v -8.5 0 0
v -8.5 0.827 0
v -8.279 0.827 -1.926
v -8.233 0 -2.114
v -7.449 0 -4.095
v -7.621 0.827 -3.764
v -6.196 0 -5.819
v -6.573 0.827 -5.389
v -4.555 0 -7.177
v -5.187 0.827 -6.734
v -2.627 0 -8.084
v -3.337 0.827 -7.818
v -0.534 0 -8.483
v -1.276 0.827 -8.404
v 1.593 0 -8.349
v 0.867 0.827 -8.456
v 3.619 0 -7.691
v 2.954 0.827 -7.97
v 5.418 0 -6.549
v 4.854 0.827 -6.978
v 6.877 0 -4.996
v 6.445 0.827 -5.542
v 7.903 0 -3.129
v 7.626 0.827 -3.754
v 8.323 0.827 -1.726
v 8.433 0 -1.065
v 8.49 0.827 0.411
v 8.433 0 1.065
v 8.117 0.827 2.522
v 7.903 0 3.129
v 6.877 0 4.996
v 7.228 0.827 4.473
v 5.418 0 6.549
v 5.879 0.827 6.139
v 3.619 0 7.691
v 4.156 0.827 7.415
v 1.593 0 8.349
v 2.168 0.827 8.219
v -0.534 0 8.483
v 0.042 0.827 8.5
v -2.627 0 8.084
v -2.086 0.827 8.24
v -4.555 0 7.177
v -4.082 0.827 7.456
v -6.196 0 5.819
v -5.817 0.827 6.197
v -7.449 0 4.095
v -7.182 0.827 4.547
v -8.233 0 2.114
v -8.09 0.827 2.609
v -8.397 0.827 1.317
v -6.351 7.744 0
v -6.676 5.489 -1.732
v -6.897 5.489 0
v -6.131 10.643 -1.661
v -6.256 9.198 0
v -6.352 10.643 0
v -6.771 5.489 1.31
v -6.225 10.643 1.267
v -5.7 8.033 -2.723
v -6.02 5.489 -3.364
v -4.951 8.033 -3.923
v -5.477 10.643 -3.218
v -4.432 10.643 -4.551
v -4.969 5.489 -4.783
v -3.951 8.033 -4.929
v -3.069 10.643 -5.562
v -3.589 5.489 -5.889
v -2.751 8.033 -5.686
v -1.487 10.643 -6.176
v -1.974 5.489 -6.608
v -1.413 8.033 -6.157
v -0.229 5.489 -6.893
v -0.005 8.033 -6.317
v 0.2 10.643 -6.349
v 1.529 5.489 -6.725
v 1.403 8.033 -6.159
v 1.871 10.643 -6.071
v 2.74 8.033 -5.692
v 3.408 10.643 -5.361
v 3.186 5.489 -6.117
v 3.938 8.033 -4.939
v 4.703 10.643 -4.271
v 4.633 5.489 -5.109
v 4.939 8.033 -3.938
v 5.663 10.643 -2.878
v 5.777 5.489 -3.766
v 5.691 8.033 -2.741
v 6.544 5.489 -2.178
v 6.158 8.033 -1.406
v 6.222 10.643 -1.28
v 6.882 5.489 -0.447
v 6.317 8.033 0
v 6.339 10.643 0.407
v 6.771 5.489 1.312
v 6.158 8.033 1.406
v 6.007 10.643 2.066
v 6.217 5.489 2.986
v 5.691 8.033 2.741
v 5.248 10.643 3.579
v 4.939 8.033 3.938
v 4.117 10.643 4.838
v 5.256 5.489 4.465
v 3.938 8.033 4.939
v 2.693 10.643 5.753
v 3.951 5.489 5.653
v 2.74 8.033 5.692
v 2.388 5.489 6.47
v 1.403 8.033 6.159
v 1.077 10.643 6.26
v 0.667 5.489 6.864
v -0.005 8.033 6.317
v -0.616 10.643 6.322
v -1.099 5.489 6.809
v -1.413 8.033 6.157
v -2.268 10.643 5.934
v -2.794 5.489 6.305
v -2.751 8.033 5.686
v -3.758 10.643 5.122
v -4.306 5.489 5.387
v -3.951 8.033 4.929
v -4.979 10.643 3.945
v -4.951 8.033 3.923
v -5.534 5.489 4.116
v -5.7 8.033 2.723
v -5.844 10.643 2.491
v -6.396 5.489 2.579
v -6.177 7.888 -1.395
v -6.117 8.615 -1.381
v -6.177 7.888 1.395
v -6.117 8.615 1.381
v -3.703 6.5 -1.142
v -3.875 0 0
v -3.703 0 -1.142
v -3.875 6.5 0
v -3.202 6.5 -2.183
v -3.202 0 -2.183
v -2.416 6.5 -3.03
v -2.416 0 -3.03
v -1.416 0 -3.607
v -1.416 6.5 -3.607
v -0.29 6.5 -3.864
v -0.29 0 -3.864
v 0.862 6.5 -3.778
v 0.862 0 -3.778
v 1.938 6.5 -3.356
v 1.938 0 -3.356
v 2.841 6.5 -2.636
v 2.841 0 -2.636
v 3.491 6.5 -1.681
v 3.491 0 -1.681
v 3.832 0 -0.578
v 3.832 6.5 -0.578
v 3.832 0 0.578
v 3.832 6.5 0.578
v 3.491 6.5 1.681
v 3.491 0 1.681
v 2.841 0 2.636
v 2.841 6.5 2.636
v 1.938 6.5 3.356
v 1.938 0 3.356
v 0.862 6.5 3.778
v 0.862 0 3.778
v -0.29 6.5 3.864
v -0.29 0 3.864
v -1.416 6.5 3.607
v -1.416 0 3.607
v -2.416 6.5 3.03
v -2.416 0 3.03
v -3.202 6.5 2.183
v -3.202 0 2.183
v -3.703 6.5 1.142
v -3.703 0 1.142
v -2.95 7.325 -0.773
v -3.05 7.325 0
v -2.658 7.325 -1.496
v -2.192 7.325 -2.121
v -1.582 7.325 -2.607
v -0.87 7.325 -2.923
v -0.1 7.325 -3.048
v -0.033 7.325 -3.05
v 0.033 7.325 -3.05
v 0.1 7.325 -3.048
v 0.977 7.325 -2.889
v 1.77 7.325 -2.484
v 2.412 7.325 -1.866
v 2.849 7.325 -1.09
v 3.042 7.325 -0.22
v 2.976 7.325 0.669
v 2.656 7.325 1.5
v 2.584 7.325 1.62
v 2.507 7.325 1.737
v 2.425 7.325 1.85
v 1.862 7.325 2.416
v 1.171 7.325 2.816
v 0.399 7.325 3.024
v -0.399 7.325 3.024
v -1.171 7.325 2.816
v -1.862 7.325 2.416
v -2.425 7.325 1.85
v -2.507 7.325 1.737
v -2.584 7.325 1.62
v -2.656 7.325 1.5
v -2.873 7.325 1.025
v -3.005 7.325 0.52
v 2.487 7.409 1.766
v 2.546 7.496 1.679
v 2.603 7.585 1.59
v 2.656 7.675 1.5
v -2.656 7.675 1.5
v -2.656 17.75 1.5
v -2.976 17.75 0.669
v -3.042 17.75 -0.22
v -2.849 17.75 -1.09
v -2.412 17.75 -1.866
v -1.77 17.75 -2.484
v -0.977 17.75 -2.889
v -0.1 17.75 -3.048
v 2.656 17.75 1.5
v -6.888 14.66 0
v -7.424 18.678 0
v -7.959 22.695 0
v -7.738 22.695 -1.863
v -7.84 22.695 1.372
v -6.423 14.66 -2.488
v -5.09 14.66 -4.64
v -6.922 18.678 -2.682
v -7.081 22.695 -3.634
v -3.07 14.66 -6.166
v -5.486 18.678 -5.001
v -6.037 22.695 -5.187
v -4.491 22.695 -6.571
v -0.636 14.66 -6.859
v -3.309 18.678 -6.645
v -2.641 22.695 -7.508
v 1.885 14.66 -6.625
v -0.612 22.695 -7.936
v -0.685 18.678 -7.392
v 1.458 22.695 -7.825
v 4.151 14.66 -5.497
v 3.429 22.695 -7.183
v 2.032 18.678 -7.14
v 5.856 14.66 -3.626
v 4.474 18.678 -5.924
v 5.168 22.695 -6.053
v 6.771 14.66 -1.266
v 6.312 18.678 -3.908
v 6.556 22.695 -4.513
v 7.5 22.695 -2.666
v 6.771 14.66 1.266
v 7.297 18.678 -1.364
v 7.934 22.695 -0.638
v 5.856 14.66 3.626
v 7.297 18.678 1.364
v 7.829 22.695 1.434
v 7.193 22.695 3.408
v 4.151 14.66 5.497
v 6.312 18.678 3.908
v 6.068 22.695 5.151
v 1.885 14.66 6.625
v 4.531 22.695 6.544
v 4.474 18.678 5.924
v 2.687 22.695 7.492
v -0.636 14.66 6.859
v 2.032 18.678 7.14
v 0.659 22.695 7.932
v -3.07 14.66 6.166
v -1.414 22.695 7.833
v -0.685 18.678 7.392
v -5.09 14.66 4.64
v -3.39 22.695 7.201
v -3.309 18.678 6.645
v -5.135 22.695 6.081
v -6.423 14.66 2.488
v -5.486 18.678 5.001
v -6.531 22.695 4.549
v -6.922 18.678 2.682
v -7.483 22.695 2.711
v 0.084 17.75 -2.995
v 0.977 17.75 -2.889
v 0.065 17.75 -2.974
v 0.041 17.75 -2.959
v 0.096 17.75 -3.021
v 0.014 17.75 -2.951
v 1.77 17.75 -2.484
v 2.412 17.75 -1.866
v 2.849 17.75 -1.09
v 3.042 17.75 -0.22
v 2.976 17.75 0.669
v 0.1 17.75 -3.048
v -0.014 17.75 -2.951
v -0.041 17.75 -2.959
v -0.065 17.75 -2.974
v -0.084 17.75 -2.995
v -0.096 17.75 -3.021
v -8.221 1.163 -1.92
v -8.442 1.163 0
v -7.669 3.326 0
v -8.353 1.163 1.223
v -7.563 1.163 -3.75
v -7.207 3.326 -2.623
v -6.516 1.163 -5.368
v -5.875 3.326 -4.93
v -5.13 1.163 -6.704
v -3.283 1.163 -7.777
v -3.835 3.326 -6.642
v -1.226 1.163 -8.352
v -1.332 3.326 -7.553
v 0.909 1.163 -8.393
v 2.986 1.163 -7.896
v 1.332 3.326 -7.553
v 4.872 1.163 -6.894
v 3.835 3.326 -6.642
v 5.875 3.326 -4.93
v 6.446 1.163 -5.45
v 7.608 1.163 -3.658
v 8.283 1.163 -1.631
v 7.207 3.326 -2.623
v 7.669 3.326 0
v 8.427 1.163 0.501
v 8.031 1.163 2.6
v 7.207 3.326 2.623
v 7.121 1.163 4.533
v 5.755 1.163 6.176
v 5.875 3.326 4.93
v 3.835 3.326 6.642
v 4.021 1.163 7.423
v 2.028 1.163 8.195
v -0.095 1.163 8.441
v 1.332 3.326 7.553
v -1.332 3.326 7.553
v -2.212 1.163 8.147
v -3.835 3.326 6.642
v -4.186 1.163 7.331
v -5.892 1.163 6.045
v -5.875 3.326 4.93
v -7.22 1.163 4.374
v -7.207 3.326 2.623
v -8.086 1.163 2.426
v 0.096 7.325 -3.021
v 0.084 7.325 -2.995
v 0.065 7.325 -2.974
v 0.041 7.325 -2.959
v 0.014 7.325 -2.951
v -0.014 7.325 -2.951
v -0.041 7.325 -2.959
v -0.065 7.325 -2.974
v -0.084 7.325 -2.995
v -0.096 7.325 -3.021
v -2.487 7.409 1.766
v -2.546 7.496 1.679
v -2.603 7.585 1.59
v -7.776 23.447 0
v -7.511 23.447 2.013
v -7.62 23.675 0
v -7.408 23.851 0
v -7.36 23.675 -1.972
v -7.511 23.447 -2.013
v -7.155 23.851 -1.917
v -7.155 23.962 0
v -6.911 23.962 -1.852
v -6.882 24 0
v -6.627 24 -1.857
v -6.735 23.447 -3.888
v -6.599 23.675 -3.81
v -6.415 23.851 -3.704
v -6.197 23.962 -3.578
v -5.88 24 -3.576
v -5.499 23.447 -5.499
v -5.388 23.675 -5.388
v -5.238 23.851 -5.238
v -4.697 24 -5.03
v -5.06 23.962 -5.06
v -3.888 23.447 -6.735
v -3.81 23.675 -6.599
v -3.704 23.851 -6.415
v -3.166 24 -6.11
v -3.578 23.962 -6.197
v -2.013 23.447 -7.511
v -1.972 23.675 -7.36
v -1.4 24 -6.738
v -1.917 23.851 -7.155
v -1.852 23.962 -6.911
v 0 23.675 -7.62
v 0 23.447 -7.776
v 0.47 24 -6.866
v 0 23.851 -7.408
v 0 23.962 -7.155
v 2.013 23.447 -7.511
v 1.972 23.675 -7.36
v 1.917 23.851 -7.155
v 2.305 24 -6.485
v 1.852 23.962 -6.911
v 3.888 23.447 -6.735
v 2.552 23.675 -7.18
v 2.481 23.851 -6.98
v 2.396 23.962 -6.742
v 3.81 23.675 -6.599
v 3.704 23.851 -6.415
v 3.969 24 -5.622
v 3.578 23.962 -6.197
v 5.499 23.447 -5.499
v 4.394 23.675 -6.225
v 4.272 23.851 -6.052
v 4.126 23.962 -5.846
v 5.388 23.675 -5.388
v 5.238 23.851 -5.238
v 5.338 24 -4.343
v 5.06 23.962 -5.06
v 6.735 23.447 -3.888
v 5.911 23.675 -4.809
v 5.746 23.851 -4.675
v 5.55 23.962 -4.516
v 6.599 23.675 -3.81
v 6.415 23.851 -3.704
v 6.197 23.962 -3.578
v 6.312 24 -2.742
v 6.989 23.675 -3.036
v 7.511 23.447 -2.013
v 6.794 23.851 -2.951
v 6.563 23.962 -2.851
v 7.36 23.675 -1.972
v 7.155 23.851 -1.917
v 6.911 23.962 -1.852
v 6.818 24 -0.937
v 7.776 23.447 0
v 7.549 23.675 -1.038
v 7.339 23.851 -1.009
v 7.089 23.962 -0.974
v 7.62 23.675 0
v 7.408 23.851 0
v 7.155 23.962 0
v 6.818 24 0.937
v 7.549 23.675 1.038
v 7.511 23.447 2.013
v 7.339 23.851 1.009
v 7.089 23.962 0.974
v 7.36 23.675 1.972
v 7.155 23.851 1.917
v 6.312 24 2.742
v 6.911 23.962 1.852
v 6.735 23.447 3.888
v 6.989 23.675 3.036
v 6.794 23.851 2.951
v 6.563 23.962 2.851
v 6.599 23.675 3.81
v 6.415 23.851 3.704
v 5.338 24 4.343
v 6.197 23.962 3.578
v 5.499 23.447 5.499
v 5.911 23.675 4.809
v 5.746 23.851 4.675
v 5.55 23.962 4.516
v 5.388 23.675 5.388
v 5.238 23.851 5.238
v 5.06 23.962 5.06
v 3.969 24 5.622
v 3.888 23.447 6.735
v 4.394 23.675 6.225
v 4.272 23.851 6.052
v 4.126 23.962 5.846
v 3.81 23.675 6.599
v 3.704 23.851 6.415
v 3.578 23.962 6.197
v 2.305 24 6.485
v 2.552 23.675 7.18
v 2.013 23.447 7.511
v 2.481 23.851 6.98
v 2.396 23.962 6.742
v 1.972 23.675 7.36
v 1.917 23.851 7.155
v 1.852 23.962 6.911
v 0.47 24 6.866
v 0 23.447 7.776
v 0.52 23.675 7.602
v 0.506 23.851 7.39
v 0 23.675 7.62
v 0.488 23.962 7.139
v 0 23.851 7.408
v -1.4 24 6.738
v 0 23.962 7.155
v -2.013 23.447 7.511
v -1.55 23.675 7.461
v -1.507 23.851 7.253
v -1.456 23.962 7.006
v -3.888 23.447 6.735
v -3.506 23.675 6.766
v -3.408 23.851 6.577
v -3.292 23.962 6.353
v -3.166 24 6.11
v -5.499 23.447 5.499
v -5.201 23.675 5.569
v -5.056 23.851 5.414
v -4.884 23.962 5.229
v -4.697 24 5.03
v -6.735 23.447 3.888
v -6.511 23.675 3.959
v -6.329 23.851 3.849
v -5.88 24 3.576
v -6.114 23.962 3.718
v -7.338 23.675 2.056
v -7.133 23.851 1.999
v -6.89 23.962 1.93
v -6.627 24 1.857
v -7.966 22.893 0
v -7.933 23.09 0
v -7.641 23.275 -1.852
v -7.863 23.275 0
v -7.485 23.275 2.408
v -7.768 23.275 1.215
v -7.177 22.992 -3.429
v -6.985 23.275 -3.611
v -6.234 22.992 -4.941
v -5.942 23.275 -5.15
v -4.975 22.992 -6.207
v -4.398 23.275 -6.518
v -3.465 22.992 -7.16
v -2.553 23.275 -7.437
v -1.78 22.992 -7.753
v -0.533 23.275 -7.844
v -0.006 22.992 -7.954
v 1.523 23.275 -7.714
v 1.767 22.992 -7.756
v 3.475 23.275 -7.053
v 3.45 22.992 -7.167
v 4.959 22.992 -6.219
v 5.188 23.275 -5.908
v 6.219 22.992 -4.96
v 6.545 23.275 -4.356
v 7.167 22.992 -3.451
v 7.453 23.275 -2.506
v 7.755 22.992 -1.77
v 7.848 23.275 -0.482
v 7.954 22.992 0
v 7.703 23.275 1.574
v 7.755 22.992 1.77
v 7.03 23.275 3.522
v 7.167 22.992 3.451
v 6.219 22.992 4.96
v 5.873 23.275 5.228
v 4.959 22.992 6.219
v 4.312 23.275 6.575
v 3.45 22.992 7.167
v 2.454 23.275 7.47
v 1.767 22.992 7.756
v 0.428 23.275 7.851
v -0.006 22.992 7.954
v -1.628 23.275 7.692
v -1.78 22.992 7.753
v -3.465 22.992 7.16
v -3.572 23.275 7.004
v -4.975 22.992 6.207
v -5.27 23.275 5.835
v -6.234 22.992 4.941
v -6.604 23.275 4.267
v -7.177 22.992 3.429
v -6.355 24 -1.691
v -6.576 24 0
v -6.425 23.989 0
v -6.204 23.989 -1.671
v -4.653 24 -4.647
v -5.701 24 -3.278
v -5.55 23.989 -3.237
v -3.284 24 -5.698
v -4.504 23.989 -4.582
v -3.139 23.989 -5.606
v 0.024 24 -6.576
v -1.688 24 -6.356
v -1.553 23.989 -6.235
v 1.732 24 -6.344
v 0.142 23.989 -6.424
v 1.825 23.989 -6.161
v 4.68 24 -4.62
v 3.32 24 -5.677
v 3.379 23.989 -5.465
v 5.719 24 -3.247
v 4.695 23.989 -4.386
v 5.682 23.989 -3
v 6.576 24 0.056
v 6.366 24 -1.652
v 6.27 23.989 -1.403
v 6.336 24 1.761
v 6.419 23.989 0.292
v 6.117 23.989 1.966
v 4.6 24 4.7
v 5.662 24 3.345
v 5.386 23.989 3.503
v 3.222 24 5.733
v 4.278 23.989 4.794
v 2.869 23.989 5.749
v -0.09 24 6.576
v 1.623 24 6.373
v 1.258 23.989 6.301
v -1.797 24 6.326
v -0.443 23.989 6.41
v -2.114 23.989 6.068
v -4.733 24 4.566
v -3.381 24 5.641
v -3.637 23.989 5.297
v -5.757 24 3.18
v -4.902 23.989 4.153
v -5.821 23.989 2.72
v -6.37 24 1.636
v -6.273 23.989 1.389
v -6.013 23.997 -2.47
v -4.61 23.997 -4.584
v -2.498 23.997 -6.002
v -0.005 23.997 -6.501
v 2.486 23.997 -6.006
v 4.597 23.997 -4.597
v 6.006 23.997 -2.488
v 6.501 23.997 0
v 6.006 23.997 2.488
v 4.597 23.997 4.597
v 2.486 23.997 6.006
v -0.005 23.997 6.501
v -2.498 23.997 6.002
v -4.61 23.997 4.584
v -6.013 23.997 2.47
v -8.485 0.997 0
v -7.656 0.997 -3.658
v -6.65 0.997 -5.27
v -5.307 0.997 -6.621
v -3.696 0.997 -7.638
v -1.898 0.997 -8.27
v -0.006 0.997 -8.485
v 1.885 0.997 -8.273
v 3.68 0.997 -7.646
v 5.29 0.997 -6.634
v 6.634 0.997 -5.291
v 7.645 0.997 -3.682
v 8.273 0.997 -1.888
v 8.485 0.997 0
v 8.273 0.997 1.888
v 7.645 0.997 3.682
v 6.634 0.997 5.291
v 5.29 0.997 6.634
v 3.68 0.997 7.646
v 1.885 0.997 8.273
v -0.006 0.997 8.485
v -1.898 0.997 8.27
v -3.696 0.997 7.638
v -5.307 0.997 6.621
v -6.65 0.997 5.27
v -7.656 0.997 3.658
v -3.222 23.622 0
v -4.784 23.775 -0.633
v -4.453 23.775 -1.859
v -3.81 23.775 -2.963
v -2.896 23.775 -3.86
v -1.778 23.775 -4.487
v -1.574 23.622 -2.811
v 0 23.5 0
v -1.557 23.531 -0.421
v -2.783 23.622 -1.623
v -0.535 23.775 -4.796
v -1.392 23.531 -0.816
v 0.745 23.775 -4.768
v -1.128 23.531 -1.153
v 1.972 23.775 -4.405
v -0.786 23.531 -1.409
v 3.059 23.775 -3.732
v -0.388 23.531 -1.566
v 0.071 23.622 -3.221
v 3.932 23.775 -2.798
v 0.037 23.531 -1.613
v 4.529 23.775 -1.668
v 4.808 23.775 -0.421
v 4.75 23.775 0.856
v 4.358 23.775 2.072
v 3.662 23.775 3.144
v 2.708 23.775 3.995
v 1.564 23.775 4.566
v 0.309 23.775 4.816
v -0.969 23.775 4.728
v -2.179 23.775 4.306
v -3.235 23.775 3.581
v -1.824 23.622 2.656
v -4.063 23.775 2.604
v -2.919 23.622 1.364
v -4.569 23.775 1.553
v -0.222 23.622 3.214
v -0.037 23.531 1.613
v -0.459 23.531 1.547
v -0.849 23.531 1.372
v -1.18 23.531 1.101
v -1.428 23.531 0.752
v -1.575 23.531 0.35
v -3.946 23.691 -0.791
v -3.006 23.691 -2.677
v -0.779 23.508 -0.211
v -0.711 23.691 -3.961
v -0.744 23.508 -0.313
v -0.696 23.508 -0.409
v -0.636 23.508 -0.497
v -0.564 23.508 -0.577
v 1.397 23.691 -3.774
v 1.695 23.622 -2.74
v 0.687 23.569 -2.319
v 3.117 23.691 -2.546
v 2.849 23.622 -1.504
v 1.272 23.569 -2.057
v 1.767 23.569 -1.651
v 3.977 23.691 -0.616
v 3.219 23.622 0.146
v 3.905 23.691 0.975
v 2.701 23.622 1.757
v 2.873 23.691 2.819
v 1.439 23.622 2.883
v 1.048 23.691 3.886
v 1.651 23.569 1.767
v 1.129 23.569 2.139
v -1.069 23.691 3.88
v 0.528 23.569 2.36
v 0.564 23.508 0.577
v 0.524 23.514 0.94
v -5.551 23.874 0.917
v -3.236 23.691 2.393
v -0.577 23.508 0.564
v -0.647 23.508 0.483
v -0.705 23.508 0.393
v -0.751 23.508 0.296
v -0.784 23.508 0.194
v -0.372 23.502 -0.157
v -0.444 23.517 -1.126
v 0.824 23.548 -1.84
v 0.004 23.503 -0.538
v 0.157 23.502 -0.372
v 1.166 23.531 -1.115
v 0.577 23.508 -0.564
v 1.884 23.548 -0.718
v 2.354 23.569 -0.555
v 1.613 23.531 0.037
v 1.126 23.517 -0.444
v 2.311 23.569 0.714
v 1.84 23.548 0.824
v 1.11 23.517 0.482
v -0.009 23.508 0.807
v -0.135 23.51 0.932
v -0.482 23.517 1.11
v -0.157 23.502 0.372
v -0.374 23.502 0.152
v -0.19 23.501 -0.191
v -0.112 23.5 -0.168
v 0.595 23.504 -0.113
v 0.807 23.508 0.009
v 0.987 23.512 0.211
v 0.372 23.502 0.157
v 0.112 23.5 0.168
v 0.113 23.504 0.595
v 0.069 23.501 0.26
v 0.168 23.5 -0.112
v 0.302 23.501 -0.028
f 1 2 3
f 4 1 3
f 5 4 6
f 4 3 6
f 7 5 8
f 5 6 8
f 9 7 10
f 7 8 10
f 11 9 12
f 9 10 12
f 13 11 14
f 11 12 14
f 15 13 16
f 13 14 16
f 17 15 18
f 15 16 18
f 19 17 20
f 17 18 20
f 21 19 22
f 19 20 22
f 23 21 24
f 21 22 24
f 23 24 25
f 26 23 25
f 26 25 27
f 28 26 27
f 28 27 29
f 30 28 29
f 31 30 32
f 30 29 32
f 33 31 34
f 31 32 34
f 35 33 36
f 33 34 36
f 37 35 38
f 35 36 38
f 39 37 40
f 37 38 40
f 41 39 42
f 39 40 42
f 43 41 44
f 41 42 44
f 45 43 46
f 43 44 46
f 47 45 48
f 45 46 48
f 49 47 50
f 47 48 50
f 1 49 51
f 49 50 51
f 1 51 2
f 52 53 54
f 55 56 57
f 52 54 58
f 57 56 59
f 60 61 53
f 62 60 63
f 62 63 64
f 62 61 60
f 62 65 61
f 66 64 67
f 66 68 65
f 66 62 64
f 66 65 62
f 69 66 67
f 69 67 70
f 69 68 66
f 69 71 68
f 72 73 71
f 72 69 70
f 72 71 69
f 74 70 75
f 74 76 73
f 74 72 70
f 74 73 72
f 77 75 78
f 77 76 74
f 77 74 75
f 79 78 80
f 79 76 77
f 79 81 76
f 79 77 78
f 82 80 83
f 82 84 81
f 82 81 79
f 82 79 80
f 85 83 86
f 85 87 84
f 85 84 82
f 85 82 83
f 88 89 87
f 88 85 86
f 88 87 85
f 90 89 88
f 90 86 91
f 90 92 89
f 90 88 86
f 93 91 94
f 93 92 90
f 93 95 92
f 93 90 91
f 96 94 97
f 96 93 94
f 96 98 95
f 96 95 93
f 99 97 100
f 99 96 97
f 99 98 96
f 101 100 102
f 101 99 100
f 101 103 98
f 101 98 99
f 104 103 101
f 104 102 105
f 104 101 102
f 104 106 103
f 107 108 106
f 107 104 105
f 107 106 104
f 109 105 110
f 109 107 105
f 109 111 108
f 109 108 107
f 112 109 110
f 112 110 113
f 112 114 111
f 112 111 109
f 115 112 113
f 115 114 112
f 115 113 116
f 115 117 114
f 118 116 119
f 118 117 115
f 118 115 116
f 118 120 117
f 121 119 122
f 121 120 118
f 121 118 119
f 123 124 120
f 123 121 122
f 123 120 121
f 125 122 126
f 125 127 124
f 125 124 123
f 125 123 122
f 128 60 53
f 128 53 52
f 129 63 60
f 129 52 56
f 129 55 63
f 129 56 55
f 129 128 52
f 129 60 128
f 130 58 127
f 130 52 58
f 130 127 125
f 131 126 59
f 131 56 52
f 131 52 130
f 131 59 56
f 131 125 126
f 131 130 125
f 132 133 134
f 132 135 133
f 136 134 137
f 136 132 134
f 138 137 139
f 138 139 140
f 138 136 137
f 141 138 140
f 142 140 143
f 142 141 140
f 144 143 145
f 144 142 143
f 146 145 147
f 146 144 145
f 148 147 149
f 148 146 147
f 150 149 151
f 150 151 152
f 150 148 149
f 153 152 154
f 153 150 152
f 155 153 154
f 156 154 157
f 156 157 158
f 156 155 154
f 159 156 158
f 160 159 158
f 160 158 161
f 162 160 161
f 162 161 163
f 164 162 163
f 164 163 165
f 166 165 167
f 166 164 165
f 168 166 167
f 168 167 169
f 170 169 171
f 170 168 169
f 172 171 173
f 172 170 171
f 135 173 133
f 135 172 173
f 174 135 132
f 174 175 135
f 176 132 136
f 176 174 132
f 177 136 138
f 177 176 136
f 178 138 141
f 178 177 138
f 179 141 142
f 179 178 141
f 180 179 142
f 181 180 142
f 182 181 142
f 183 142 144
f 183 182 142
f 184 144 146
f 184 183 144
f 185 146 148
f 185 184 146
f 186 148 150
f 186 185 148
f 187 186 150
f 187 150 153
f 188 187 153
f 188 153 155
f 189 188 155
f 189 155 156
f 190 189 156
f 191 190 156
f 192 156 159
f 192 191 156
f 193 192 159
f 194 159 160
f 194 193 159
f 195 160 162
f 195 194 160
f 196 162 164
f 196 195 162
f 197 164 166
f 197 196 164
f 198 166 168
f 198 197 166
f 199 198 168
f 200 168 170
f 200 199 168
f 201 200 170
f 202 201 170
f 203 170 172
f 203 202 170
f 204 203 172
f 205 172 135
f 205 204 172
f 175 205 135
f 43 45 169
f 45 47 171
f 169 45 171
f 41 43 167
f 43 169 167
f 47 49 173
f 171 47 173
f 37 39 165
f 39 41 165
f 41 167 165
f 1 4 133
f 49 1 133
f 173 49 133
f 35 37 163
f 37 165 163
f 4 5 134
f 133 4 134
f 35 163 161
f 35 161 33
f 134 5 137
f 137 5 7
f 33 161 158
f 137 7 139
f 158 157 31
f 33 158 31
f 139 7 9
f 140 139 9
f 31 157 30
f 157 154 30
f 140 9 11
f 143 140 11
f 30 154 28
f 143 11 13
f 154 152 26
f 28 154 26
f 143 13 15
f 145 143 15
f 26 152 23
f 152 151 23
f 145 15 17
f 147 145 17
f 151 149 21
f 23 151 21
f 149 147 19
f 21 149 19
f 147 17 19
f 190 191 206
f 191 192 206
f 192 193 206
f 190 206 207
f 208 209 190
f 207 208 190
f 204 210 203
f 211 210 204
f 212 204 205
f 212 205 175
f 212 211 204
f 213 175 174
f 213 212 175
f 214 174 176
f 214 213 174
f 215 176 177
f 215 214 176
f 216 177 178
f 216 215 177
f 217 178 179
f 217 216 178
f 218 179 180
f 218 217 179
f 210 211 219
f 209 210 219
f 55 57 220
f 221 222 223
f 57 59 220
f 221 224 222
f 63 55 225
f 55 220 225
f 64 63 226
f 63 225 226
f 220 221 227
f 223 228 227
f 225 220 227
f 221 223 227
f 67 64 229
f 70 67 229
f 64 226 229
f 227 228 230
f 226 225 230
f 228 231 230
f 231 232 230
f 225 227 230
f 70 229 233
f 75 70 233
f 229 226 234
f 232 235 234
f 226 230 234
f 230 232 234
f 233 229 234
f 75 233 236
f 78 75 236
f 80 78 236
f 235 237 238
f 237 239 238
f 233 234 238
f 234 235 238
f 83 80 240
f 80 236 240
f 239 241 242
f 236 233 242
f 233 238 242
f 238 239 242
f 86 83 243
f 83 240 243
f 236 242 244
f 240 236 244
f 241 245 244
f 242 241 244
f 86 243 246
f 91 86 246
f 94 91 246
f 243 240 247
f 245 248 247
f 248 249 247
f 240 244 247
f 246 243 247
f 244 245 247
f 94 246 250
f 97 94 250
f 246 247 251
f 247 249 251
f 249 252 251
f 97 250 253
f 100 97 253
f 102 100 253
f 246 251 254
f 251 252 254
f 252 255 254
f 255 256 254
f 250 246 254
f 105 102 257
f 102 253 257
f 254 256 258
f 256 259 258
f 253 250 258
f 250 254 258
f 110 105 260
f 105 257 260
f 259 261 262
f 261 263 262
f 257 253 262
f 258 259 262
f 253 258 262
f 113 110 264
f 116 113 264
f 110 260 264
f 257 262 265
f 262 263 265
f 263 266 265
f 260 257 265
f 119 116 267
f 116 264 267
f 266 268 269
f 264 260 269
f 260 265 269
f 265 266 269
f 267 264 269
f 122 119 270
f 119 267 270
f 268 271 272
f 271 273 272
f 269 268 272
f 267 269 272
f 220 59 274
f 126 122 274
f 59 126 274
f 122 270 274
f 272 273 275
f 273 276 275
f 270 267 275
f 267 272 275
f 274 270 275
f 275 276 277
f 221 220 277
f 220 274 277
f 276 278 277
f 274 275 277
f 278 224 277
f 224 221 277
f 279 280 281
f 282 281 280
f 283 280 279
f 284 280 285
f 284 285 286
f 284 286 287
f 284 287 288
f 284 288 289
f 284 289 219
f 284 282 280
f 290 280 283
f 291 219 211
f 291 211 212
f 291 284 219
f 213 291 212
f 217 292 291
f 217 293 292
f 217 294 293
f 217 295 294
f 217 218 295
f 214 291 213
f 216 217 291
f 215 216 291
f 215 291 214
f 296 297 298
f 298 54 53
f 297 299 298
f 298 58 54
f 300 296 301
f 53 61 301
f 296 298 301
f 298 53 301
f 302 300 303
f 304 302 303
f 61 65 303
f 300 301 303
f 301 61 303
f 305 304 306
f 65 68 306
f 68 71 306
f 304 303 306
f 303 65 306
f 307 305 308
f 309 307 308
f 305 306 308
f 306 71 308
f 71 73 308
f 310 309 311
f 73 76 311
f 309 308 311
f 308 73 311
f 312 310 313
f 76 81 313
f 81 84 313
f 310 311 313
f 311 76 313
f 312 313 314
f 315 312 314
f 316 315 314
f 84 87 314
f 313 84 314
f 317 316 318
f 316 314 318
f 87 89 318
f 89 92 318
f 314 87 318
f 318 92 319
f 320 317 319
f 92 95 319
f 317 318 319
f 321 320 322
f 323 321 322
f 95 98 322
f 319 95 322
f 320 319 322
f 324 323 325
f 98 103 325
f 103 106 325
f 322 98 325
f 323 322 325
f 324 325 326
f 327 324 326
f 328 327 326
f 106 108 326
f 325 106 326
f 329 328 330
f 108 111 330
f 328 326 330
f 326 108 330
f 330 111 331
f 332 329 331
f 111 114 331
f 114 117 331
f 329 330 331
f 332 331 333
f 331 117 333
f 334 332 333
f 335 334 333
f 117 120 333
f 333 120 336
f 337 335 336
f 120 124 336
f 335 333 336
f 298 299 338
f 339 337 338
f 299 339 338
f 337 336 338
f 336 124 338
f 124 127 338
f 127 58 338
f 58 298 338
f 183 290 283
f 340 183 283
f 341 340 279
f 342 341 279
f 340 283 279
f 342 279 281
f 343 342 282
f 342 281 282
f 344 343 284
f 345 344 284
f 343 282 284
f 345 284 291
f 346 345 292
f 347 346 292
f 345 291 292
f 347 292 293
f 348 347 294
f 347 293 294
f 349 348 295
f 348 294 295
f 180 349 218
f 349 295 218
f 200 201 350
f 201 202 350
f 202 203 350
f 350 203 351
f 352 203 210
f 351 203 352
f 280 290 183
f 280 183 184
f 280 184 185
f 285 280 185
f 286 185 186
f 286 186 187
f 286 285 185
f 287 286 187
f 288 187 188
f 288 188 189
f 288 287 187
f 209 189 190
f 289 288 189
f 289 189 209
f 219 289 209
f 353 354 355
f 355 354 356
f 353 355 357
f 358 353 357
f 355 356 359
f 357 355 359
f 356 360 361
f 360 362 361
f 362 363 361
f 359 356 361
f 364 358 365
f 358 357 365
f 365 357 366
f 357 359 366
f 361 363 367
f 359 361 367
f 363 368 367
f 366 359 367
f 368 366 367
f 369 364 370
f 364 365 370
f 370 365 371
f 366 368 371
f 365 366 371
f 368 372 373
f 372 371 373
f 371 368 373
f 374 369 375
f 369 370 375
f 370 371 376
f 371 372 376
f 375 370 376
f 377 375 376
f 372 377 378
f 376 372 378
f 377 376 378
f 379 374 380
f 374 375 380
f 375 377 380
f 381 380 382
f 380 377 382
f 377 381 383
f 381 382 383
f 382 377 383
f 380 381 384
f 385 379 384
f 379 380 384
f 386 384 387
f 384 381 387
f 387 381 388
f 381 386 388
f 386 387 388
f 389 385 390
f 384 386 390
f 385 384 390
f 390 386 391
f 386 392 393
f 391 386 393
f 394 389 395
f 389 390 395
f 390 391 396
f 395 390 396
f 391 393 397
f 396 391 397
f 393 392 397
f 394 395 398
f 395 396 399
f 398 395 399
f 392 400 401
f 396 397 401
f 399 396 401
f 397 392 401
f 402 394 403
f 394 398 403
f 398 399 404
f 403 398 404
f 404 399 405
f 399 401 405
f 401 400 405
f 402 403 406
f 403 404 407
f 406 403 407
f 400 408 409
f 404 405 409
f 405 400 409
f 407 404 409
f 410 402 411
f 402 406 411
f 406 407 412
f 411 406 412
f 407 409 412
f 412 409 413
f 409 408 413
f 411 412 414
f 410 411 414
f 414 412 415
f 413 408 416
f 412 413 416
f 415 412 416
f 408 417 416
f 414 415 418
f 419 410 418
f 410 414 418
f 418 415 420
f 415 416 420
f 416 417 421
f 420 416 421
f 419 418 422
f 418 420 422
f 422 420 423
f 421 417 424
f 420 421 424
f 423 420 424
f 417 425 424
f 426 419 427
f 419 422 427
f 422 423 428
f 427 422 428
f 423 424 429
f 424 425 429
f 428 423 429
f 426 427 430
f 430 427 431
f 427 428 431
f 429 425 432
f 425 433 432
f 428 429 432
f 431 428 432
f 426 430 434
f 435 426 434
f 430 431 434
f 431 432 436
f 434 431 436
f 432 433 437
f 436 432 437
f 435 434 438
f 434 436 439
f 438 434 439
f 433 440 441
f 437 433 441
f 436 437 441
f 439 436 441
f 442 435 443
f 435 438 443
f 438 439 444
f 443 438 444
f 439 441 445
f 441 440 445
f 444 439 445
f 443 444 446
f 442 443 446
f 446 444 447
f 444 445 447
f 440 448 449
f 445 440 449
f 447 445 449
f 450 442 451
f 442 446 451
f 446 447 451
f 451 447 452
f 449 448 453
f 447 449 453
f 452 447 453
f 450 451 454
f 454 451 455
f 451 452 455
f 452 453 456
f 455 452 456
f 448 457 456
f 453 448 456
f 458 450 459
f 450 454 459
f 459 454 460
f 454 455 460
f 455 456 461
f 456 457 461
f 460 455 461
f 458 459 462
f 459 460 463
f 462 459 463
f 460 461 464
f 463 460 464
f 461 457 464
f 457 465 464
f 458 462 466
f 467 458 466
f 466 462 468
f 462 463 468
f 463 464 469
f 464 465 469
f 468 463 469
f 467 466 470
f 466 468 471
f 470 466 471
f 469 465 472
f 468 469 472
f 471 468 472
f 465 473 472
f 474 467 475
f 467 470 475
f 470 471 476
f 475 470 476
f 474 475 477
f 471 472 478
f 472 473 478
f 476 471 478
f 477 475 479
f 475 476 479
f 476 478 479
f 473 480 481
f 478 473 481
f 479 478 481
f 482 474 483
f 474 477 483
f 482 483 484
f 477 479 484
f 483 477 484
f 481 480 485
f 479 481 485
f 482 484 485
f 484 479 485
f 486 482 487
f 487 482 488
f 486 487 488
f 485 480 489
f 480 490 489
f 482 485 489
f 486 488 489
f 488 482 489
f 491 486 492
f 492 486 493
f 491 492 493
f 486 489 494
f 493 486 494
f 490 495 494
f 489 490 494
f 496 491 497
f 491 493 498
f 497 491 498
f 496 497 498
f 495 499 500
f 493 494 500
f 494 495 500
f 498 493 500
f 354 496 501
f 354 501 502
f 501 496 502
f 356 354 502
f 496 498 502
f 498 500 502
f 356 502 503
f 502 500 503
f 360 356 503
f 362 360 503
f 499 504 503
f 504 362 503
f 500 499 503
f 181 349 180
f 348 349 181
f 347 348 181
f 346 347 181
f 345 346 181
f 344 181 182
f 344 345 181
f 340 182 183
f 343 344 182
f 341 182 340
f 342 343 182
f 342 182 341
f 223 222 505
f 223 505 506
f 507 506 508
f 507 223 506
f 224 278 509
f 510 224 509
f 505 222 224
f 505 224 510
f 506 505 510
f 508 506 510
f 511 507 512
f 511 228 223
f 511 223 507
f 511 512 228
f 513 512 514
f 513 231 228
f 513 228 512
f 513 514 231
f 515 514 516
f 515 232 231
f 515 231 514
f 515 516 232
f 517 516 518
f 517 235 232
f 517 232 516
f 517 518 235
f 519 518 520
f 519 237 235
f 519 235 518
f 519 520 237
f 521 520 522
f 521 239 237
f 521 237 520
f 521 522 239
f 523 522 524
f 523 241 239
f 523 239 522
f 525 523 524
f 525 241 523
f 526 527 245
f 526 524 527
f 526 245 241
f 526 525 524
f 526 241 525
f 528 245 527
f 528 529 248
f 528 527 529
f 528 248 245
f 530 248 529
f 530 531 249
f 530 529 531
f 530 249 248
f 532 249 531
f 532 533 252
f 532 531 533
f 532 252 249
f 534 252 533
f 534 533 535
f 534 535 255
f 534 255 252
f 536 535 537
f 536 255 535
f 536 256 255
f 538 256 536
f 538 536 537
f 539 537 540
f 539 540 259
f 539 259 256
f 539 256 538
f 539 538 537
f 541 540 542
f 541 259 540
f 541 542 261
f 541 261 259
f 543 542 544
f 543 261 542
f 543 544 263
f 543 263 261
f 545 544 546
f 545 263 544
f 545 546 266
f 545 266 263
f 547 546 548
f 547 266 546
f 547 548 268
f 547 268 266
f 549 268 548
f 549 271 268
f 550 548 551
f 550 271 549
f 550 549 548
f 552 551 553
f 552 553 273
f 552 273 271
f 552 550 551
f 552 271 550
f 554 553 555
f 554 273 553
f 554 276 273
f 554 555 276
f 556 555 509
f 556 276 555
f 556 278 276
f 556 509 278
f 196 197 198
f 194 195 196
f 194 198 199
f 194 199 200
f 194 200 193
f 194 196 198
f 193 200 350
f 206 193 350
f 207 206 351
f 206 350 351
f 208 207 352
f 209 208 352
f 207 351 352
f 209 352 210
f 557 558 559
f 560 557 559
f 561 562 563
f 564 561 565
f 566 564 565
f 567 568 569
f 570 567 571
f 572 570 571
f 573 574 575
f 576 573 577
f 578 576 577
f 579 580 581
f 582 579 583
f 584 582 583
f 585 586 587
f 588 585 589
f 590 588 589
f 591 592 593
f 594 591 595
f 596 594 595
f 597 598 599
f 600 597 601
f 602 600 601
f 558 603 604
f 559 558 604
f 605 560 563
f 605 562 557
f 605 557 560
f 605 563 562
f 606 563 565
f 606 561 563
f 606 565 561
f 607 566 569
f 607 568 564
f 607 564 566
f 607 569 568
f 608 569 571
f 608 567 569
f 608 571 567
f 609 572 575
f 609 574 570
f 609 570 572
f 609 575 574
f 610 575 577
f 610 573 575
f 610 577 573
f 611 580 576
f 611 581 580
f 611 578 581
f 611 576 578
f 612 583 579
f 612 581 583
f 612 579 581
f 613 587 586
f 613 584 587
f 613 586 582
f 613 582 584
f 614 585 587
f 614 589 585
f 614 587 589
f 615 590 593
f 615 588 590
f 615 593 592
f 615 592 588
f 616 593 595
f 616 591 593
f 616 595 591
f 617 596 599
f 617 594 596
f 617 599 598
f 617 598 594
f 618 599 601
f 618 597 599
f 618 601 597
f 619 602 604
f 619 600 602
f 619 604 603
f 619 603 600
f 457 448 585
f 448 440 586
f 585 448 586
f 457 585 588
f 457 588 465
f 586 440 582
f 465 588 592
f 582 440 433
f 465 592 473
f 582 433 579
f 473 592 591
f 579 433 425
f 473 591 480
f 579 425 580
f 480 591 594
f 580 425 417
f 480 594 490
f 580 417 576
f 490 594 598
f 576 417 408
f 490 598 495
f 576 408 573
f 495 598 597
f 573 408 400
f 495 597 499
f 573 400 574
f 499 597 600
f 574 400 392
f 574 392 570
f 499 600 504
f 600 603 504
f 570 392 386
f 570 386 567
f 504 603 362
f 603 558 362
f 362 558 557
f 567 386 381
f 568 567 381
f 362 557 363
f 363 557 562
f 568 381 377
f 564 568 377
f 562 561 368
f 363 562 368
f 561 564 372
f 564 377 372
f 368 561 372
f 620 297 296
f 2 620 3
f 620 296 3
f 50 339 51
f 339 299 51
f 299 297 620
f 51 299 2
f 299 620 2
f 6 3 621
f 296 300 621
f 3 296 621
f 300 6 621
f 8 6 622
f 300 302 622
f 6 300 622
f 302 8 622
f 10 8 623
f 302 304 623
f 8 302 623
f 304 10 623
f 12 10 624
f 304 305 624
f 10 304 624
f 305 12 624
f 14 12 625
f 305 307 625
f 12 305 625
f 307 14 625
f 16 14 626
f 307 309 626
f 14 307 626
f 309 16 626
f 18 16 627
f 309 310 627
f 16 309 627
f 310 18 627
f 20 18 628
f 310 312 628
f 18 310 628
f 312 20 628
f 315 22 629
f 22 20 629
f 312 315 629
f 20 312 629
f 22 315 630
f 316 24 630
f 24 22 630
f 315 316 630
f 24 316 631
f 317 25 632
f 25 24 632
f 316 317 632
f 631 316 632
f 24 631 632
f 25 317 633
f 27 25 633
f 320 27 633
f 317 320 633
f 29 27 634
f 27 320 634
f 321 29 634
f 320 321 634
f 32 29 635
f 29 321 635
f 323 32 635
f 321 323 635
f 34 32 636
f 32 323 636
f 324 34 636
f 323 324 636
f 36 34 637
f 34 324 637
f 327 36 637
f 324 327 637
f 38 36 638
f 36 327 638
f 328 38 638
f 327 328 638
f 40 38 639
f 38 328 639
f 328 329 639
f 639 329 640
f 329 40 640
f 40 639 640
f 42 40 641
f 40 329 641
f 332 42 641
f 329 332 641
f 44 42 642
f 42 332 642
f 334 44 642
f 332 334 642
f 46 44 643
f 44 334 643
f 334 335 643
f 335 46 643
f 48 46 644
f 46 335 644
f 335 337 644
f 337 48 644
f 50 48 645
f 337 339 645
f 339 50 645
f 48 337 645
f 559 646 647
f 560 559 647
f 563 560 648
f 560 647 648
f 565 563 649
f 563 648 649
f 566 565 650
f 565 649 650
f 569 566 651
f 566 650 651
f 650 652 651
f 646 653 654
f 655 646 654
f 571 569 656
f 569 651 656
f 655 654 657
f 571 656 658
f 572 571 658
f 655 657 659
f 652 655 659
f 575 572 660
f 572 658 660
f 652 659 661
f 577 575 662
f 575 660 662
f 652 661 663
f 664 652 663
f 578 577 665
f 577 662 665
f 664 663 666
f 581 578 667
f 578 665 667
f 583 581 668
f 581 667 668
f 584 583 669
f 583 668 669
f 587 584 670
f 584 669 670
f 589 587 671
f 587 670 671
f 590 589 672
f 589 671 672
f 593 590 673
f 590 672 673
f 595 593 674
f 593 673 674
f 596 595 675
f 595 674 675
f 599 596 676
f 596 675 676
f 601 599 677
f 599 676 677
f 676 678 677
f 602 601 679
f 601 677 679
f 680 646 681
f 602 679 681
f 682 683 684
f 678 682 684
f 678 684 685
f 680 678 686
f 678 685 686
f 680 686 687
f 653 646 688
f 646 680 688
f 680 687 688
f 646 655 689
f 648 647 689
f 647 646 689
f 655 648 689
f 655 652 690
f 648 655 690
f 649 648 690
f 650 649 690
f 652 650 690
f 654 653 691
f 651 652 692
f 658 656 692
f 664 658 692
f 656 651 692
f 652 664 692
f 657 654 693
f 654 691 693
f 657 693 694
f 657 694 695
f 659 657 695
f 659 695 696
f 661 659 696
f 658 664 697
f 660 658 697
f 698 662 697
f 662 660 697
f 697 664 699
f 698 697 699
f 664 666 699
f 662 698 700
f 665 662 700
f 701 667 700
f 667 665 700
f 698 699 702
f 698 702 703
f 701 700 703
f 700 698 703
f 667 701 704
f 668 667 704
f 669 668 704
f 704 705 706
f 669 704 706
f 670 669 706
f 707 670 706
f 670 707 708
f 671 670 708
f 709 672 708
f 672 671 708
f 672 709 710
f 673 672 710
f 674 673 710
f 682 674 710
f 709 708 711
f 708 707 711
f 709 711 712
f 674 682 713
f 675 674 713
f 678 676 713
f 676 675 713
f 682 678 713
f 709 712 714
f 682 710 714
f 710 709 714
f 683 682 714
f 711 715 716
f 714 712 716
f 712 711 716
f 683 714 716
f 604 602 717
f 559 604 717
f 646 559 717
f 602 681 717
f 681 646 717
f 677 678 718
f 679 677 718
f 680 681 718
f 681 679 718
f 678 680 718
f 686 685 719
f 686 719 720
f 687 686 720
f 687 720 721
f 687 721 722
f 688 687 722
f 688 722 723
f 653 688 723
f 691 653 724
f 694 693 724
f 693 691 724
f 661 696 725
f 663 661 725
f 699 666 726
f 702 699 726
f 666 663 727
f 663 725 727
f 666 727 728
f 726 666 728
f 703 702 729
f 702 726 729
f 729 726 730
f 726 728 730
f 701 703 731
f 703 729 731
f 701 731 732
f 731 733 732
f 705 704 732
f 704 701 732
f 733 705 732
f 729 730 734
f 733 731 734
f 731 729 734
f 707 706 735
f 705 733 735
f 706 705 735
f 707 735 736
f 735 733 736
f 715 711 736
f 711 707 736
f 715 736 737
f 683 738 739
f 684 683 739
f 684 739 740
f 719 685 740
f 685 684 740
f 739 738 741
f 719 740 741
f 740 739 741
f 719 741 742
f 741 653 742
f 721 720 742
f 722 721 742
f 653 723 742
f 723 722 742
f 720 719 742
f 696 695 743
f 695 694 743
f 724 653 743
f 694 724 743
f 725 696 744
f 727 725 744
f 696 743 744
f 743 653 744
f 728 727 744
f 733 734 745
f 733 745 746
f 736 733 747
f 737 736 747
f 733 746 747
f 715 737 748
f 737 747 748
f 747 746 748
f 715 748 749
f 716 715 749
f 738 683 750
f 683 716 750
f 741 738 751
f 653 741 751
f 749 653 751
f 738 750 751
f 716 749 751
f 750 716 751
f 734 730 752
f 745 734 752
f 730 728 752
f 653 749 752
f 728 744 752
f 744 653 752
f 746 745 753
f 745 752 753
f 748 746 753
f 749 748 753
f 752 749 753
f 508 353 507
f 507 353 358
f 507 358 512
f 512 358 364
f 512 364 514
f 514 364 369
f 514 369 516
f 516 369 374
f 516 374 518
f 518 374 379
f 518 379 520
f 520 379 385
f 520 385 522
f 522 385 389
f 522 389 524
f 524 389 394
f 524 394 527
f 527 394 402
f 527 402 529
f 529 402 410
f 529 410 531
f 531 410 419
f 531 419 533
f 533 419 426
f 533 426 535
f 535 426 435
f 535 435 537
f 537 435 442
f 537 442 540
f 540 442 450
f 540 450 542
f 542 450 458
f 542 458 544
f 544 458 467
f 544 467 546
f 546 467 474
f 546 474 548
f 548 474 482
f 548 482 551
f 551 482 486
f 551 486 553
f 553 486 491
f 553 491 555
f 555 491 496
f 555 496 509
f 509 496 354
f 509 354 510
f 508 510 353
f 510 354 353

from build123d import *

# Parameters (mm, degrees)
FILLET1_R           = 11
FILLET2_R           = 1
BOSS_EXTRUDE1_DEPTH = 10.425
CHAMFER1_SIZE       = 0.35


with BuildPart() as part:
    # Sketch1 → Revolve1 (revolve)
    with BuildSketch(Plane.XY, mode=Mode.PRIVATE) as revolve1_sk:
        with BuildLine():
            Line((0, 0), (8.5, 0))
            Line((8.5, 0), (8.5, 1))
            Line((8.5, 1), (6, 8))
            Line((6, 8), (8, 23))
            Line((8, 23), (7.5, 24))
            Line((7.5, 24), (6.5, 24))
            add(Edge.make_bspline(
                [(6.5, 24), (3.269230769, 23.5), (0, 23.5)],
                knots=[0, 0, 0, 1, 1, 1], degree=2))
            Line((0, 23.5), (0, 0))
        make_face()
    revolve(revolve1_sk.sketch.rotate(Axis((0, 23.5, 0), (0, -1, 0)), 180), axis=Axis((0, 23.5, 0), (0, -1, 0)))

    # Fillet1
    fillet1_edges = [part.edges().sort_by_distance(p)[0] for p in [
        (6, 8, 0),
    ]]
    fillet(fillet1_edges, radius=FILLET1_R)

    # Fillet2
    fillet2_edges = [part.edges().sort_by_distance(p)[0] for p in [
        (6.5, 24, 0),
        (7.5, 24, 0),
        (8, 23, 0),
        (8.5, 1, 0),
    ]]
    fillet(fillet2_edges, radius=FILLET2_R)

    # Sketch3 → Cut-Revolve1 (revolve, cut)
    with BuildSketch(Plane.XY, mode=Mode.PRIVATE) as cut_revolve1_sk:
        Polygon((0, 0), (3.875, 0), (3.875, 6.5), (3.05, 7.325), (3.05, 17.75), (0, 17.75), align=None)
    revolve(cut_revolve1_sk.sketch.rotate(Axis((0, 17.75, 0), (0, -1, 0)), 180), axis=Axis((0, 17.75, 0), (0, -1, 0)), mode=Mode.SUBTRACT)

    # Sketch4 → Boss-Extrude1 (add)
    with BuildSketch(Plane.XZ.offset(-17.75)):
        with BuildLine():
            Line((-2.655654345, 1.5), (2.655654345, 1.5))
            ThreePointArc((2.655654345, 1.5), (0, 3.05), (-2.655654345, 1.5))
        make_face()
        with BuildLine():
            ThreePointArc((-0.099986562, -3.048360656), (0, -3.05), (0.099986562, -3.048360656))
            ThreePointArc((0.099986562, -3.048360656), (0, -2.95), (-0.099986562, -3.048360656))
        make_face()
    extrude(amount=BOSS_EXTRUDE1_DEPTH)

    # Chamfer1
    # the kernel refuses this chamfer: 0.35 mm, written as the material it takes off along each edge
    with BuildSketch(Plane(origin=(-3.555743391, 7.325, 1.5), x_dir=(0, -0.02749587661058614, 0.9996219169112968), z_dir=(1, 0, 0))) as chamfer1_piece_1_section:
        Polygon((CHAMFER1_SIZE * 0.999621916911, -CHAMFER1_SIZE * 0.0274958766106), (-CHAMFER1_SIZE * 0.0274958766106, -CHAMFER1_SIZE * 0.999621916911), (0, 0), align=None)
    chamfer1_piece_1 = extrude(amount=7.111486782, mode=Mode.PRIVATE)
    chamfer1_piece_1 = chamfer1_piece_1 & Plane(origin=(0, 7.499624527, 0), x_dir=(-1, 0, 0), z_dir=(0, 1, 0)) * Cylinder(3.05, 16, mode=Mode.PRIVATE)
    add(chamfer1_piece_1, mode=Mode.SUBTRACT)


solid = part.part
